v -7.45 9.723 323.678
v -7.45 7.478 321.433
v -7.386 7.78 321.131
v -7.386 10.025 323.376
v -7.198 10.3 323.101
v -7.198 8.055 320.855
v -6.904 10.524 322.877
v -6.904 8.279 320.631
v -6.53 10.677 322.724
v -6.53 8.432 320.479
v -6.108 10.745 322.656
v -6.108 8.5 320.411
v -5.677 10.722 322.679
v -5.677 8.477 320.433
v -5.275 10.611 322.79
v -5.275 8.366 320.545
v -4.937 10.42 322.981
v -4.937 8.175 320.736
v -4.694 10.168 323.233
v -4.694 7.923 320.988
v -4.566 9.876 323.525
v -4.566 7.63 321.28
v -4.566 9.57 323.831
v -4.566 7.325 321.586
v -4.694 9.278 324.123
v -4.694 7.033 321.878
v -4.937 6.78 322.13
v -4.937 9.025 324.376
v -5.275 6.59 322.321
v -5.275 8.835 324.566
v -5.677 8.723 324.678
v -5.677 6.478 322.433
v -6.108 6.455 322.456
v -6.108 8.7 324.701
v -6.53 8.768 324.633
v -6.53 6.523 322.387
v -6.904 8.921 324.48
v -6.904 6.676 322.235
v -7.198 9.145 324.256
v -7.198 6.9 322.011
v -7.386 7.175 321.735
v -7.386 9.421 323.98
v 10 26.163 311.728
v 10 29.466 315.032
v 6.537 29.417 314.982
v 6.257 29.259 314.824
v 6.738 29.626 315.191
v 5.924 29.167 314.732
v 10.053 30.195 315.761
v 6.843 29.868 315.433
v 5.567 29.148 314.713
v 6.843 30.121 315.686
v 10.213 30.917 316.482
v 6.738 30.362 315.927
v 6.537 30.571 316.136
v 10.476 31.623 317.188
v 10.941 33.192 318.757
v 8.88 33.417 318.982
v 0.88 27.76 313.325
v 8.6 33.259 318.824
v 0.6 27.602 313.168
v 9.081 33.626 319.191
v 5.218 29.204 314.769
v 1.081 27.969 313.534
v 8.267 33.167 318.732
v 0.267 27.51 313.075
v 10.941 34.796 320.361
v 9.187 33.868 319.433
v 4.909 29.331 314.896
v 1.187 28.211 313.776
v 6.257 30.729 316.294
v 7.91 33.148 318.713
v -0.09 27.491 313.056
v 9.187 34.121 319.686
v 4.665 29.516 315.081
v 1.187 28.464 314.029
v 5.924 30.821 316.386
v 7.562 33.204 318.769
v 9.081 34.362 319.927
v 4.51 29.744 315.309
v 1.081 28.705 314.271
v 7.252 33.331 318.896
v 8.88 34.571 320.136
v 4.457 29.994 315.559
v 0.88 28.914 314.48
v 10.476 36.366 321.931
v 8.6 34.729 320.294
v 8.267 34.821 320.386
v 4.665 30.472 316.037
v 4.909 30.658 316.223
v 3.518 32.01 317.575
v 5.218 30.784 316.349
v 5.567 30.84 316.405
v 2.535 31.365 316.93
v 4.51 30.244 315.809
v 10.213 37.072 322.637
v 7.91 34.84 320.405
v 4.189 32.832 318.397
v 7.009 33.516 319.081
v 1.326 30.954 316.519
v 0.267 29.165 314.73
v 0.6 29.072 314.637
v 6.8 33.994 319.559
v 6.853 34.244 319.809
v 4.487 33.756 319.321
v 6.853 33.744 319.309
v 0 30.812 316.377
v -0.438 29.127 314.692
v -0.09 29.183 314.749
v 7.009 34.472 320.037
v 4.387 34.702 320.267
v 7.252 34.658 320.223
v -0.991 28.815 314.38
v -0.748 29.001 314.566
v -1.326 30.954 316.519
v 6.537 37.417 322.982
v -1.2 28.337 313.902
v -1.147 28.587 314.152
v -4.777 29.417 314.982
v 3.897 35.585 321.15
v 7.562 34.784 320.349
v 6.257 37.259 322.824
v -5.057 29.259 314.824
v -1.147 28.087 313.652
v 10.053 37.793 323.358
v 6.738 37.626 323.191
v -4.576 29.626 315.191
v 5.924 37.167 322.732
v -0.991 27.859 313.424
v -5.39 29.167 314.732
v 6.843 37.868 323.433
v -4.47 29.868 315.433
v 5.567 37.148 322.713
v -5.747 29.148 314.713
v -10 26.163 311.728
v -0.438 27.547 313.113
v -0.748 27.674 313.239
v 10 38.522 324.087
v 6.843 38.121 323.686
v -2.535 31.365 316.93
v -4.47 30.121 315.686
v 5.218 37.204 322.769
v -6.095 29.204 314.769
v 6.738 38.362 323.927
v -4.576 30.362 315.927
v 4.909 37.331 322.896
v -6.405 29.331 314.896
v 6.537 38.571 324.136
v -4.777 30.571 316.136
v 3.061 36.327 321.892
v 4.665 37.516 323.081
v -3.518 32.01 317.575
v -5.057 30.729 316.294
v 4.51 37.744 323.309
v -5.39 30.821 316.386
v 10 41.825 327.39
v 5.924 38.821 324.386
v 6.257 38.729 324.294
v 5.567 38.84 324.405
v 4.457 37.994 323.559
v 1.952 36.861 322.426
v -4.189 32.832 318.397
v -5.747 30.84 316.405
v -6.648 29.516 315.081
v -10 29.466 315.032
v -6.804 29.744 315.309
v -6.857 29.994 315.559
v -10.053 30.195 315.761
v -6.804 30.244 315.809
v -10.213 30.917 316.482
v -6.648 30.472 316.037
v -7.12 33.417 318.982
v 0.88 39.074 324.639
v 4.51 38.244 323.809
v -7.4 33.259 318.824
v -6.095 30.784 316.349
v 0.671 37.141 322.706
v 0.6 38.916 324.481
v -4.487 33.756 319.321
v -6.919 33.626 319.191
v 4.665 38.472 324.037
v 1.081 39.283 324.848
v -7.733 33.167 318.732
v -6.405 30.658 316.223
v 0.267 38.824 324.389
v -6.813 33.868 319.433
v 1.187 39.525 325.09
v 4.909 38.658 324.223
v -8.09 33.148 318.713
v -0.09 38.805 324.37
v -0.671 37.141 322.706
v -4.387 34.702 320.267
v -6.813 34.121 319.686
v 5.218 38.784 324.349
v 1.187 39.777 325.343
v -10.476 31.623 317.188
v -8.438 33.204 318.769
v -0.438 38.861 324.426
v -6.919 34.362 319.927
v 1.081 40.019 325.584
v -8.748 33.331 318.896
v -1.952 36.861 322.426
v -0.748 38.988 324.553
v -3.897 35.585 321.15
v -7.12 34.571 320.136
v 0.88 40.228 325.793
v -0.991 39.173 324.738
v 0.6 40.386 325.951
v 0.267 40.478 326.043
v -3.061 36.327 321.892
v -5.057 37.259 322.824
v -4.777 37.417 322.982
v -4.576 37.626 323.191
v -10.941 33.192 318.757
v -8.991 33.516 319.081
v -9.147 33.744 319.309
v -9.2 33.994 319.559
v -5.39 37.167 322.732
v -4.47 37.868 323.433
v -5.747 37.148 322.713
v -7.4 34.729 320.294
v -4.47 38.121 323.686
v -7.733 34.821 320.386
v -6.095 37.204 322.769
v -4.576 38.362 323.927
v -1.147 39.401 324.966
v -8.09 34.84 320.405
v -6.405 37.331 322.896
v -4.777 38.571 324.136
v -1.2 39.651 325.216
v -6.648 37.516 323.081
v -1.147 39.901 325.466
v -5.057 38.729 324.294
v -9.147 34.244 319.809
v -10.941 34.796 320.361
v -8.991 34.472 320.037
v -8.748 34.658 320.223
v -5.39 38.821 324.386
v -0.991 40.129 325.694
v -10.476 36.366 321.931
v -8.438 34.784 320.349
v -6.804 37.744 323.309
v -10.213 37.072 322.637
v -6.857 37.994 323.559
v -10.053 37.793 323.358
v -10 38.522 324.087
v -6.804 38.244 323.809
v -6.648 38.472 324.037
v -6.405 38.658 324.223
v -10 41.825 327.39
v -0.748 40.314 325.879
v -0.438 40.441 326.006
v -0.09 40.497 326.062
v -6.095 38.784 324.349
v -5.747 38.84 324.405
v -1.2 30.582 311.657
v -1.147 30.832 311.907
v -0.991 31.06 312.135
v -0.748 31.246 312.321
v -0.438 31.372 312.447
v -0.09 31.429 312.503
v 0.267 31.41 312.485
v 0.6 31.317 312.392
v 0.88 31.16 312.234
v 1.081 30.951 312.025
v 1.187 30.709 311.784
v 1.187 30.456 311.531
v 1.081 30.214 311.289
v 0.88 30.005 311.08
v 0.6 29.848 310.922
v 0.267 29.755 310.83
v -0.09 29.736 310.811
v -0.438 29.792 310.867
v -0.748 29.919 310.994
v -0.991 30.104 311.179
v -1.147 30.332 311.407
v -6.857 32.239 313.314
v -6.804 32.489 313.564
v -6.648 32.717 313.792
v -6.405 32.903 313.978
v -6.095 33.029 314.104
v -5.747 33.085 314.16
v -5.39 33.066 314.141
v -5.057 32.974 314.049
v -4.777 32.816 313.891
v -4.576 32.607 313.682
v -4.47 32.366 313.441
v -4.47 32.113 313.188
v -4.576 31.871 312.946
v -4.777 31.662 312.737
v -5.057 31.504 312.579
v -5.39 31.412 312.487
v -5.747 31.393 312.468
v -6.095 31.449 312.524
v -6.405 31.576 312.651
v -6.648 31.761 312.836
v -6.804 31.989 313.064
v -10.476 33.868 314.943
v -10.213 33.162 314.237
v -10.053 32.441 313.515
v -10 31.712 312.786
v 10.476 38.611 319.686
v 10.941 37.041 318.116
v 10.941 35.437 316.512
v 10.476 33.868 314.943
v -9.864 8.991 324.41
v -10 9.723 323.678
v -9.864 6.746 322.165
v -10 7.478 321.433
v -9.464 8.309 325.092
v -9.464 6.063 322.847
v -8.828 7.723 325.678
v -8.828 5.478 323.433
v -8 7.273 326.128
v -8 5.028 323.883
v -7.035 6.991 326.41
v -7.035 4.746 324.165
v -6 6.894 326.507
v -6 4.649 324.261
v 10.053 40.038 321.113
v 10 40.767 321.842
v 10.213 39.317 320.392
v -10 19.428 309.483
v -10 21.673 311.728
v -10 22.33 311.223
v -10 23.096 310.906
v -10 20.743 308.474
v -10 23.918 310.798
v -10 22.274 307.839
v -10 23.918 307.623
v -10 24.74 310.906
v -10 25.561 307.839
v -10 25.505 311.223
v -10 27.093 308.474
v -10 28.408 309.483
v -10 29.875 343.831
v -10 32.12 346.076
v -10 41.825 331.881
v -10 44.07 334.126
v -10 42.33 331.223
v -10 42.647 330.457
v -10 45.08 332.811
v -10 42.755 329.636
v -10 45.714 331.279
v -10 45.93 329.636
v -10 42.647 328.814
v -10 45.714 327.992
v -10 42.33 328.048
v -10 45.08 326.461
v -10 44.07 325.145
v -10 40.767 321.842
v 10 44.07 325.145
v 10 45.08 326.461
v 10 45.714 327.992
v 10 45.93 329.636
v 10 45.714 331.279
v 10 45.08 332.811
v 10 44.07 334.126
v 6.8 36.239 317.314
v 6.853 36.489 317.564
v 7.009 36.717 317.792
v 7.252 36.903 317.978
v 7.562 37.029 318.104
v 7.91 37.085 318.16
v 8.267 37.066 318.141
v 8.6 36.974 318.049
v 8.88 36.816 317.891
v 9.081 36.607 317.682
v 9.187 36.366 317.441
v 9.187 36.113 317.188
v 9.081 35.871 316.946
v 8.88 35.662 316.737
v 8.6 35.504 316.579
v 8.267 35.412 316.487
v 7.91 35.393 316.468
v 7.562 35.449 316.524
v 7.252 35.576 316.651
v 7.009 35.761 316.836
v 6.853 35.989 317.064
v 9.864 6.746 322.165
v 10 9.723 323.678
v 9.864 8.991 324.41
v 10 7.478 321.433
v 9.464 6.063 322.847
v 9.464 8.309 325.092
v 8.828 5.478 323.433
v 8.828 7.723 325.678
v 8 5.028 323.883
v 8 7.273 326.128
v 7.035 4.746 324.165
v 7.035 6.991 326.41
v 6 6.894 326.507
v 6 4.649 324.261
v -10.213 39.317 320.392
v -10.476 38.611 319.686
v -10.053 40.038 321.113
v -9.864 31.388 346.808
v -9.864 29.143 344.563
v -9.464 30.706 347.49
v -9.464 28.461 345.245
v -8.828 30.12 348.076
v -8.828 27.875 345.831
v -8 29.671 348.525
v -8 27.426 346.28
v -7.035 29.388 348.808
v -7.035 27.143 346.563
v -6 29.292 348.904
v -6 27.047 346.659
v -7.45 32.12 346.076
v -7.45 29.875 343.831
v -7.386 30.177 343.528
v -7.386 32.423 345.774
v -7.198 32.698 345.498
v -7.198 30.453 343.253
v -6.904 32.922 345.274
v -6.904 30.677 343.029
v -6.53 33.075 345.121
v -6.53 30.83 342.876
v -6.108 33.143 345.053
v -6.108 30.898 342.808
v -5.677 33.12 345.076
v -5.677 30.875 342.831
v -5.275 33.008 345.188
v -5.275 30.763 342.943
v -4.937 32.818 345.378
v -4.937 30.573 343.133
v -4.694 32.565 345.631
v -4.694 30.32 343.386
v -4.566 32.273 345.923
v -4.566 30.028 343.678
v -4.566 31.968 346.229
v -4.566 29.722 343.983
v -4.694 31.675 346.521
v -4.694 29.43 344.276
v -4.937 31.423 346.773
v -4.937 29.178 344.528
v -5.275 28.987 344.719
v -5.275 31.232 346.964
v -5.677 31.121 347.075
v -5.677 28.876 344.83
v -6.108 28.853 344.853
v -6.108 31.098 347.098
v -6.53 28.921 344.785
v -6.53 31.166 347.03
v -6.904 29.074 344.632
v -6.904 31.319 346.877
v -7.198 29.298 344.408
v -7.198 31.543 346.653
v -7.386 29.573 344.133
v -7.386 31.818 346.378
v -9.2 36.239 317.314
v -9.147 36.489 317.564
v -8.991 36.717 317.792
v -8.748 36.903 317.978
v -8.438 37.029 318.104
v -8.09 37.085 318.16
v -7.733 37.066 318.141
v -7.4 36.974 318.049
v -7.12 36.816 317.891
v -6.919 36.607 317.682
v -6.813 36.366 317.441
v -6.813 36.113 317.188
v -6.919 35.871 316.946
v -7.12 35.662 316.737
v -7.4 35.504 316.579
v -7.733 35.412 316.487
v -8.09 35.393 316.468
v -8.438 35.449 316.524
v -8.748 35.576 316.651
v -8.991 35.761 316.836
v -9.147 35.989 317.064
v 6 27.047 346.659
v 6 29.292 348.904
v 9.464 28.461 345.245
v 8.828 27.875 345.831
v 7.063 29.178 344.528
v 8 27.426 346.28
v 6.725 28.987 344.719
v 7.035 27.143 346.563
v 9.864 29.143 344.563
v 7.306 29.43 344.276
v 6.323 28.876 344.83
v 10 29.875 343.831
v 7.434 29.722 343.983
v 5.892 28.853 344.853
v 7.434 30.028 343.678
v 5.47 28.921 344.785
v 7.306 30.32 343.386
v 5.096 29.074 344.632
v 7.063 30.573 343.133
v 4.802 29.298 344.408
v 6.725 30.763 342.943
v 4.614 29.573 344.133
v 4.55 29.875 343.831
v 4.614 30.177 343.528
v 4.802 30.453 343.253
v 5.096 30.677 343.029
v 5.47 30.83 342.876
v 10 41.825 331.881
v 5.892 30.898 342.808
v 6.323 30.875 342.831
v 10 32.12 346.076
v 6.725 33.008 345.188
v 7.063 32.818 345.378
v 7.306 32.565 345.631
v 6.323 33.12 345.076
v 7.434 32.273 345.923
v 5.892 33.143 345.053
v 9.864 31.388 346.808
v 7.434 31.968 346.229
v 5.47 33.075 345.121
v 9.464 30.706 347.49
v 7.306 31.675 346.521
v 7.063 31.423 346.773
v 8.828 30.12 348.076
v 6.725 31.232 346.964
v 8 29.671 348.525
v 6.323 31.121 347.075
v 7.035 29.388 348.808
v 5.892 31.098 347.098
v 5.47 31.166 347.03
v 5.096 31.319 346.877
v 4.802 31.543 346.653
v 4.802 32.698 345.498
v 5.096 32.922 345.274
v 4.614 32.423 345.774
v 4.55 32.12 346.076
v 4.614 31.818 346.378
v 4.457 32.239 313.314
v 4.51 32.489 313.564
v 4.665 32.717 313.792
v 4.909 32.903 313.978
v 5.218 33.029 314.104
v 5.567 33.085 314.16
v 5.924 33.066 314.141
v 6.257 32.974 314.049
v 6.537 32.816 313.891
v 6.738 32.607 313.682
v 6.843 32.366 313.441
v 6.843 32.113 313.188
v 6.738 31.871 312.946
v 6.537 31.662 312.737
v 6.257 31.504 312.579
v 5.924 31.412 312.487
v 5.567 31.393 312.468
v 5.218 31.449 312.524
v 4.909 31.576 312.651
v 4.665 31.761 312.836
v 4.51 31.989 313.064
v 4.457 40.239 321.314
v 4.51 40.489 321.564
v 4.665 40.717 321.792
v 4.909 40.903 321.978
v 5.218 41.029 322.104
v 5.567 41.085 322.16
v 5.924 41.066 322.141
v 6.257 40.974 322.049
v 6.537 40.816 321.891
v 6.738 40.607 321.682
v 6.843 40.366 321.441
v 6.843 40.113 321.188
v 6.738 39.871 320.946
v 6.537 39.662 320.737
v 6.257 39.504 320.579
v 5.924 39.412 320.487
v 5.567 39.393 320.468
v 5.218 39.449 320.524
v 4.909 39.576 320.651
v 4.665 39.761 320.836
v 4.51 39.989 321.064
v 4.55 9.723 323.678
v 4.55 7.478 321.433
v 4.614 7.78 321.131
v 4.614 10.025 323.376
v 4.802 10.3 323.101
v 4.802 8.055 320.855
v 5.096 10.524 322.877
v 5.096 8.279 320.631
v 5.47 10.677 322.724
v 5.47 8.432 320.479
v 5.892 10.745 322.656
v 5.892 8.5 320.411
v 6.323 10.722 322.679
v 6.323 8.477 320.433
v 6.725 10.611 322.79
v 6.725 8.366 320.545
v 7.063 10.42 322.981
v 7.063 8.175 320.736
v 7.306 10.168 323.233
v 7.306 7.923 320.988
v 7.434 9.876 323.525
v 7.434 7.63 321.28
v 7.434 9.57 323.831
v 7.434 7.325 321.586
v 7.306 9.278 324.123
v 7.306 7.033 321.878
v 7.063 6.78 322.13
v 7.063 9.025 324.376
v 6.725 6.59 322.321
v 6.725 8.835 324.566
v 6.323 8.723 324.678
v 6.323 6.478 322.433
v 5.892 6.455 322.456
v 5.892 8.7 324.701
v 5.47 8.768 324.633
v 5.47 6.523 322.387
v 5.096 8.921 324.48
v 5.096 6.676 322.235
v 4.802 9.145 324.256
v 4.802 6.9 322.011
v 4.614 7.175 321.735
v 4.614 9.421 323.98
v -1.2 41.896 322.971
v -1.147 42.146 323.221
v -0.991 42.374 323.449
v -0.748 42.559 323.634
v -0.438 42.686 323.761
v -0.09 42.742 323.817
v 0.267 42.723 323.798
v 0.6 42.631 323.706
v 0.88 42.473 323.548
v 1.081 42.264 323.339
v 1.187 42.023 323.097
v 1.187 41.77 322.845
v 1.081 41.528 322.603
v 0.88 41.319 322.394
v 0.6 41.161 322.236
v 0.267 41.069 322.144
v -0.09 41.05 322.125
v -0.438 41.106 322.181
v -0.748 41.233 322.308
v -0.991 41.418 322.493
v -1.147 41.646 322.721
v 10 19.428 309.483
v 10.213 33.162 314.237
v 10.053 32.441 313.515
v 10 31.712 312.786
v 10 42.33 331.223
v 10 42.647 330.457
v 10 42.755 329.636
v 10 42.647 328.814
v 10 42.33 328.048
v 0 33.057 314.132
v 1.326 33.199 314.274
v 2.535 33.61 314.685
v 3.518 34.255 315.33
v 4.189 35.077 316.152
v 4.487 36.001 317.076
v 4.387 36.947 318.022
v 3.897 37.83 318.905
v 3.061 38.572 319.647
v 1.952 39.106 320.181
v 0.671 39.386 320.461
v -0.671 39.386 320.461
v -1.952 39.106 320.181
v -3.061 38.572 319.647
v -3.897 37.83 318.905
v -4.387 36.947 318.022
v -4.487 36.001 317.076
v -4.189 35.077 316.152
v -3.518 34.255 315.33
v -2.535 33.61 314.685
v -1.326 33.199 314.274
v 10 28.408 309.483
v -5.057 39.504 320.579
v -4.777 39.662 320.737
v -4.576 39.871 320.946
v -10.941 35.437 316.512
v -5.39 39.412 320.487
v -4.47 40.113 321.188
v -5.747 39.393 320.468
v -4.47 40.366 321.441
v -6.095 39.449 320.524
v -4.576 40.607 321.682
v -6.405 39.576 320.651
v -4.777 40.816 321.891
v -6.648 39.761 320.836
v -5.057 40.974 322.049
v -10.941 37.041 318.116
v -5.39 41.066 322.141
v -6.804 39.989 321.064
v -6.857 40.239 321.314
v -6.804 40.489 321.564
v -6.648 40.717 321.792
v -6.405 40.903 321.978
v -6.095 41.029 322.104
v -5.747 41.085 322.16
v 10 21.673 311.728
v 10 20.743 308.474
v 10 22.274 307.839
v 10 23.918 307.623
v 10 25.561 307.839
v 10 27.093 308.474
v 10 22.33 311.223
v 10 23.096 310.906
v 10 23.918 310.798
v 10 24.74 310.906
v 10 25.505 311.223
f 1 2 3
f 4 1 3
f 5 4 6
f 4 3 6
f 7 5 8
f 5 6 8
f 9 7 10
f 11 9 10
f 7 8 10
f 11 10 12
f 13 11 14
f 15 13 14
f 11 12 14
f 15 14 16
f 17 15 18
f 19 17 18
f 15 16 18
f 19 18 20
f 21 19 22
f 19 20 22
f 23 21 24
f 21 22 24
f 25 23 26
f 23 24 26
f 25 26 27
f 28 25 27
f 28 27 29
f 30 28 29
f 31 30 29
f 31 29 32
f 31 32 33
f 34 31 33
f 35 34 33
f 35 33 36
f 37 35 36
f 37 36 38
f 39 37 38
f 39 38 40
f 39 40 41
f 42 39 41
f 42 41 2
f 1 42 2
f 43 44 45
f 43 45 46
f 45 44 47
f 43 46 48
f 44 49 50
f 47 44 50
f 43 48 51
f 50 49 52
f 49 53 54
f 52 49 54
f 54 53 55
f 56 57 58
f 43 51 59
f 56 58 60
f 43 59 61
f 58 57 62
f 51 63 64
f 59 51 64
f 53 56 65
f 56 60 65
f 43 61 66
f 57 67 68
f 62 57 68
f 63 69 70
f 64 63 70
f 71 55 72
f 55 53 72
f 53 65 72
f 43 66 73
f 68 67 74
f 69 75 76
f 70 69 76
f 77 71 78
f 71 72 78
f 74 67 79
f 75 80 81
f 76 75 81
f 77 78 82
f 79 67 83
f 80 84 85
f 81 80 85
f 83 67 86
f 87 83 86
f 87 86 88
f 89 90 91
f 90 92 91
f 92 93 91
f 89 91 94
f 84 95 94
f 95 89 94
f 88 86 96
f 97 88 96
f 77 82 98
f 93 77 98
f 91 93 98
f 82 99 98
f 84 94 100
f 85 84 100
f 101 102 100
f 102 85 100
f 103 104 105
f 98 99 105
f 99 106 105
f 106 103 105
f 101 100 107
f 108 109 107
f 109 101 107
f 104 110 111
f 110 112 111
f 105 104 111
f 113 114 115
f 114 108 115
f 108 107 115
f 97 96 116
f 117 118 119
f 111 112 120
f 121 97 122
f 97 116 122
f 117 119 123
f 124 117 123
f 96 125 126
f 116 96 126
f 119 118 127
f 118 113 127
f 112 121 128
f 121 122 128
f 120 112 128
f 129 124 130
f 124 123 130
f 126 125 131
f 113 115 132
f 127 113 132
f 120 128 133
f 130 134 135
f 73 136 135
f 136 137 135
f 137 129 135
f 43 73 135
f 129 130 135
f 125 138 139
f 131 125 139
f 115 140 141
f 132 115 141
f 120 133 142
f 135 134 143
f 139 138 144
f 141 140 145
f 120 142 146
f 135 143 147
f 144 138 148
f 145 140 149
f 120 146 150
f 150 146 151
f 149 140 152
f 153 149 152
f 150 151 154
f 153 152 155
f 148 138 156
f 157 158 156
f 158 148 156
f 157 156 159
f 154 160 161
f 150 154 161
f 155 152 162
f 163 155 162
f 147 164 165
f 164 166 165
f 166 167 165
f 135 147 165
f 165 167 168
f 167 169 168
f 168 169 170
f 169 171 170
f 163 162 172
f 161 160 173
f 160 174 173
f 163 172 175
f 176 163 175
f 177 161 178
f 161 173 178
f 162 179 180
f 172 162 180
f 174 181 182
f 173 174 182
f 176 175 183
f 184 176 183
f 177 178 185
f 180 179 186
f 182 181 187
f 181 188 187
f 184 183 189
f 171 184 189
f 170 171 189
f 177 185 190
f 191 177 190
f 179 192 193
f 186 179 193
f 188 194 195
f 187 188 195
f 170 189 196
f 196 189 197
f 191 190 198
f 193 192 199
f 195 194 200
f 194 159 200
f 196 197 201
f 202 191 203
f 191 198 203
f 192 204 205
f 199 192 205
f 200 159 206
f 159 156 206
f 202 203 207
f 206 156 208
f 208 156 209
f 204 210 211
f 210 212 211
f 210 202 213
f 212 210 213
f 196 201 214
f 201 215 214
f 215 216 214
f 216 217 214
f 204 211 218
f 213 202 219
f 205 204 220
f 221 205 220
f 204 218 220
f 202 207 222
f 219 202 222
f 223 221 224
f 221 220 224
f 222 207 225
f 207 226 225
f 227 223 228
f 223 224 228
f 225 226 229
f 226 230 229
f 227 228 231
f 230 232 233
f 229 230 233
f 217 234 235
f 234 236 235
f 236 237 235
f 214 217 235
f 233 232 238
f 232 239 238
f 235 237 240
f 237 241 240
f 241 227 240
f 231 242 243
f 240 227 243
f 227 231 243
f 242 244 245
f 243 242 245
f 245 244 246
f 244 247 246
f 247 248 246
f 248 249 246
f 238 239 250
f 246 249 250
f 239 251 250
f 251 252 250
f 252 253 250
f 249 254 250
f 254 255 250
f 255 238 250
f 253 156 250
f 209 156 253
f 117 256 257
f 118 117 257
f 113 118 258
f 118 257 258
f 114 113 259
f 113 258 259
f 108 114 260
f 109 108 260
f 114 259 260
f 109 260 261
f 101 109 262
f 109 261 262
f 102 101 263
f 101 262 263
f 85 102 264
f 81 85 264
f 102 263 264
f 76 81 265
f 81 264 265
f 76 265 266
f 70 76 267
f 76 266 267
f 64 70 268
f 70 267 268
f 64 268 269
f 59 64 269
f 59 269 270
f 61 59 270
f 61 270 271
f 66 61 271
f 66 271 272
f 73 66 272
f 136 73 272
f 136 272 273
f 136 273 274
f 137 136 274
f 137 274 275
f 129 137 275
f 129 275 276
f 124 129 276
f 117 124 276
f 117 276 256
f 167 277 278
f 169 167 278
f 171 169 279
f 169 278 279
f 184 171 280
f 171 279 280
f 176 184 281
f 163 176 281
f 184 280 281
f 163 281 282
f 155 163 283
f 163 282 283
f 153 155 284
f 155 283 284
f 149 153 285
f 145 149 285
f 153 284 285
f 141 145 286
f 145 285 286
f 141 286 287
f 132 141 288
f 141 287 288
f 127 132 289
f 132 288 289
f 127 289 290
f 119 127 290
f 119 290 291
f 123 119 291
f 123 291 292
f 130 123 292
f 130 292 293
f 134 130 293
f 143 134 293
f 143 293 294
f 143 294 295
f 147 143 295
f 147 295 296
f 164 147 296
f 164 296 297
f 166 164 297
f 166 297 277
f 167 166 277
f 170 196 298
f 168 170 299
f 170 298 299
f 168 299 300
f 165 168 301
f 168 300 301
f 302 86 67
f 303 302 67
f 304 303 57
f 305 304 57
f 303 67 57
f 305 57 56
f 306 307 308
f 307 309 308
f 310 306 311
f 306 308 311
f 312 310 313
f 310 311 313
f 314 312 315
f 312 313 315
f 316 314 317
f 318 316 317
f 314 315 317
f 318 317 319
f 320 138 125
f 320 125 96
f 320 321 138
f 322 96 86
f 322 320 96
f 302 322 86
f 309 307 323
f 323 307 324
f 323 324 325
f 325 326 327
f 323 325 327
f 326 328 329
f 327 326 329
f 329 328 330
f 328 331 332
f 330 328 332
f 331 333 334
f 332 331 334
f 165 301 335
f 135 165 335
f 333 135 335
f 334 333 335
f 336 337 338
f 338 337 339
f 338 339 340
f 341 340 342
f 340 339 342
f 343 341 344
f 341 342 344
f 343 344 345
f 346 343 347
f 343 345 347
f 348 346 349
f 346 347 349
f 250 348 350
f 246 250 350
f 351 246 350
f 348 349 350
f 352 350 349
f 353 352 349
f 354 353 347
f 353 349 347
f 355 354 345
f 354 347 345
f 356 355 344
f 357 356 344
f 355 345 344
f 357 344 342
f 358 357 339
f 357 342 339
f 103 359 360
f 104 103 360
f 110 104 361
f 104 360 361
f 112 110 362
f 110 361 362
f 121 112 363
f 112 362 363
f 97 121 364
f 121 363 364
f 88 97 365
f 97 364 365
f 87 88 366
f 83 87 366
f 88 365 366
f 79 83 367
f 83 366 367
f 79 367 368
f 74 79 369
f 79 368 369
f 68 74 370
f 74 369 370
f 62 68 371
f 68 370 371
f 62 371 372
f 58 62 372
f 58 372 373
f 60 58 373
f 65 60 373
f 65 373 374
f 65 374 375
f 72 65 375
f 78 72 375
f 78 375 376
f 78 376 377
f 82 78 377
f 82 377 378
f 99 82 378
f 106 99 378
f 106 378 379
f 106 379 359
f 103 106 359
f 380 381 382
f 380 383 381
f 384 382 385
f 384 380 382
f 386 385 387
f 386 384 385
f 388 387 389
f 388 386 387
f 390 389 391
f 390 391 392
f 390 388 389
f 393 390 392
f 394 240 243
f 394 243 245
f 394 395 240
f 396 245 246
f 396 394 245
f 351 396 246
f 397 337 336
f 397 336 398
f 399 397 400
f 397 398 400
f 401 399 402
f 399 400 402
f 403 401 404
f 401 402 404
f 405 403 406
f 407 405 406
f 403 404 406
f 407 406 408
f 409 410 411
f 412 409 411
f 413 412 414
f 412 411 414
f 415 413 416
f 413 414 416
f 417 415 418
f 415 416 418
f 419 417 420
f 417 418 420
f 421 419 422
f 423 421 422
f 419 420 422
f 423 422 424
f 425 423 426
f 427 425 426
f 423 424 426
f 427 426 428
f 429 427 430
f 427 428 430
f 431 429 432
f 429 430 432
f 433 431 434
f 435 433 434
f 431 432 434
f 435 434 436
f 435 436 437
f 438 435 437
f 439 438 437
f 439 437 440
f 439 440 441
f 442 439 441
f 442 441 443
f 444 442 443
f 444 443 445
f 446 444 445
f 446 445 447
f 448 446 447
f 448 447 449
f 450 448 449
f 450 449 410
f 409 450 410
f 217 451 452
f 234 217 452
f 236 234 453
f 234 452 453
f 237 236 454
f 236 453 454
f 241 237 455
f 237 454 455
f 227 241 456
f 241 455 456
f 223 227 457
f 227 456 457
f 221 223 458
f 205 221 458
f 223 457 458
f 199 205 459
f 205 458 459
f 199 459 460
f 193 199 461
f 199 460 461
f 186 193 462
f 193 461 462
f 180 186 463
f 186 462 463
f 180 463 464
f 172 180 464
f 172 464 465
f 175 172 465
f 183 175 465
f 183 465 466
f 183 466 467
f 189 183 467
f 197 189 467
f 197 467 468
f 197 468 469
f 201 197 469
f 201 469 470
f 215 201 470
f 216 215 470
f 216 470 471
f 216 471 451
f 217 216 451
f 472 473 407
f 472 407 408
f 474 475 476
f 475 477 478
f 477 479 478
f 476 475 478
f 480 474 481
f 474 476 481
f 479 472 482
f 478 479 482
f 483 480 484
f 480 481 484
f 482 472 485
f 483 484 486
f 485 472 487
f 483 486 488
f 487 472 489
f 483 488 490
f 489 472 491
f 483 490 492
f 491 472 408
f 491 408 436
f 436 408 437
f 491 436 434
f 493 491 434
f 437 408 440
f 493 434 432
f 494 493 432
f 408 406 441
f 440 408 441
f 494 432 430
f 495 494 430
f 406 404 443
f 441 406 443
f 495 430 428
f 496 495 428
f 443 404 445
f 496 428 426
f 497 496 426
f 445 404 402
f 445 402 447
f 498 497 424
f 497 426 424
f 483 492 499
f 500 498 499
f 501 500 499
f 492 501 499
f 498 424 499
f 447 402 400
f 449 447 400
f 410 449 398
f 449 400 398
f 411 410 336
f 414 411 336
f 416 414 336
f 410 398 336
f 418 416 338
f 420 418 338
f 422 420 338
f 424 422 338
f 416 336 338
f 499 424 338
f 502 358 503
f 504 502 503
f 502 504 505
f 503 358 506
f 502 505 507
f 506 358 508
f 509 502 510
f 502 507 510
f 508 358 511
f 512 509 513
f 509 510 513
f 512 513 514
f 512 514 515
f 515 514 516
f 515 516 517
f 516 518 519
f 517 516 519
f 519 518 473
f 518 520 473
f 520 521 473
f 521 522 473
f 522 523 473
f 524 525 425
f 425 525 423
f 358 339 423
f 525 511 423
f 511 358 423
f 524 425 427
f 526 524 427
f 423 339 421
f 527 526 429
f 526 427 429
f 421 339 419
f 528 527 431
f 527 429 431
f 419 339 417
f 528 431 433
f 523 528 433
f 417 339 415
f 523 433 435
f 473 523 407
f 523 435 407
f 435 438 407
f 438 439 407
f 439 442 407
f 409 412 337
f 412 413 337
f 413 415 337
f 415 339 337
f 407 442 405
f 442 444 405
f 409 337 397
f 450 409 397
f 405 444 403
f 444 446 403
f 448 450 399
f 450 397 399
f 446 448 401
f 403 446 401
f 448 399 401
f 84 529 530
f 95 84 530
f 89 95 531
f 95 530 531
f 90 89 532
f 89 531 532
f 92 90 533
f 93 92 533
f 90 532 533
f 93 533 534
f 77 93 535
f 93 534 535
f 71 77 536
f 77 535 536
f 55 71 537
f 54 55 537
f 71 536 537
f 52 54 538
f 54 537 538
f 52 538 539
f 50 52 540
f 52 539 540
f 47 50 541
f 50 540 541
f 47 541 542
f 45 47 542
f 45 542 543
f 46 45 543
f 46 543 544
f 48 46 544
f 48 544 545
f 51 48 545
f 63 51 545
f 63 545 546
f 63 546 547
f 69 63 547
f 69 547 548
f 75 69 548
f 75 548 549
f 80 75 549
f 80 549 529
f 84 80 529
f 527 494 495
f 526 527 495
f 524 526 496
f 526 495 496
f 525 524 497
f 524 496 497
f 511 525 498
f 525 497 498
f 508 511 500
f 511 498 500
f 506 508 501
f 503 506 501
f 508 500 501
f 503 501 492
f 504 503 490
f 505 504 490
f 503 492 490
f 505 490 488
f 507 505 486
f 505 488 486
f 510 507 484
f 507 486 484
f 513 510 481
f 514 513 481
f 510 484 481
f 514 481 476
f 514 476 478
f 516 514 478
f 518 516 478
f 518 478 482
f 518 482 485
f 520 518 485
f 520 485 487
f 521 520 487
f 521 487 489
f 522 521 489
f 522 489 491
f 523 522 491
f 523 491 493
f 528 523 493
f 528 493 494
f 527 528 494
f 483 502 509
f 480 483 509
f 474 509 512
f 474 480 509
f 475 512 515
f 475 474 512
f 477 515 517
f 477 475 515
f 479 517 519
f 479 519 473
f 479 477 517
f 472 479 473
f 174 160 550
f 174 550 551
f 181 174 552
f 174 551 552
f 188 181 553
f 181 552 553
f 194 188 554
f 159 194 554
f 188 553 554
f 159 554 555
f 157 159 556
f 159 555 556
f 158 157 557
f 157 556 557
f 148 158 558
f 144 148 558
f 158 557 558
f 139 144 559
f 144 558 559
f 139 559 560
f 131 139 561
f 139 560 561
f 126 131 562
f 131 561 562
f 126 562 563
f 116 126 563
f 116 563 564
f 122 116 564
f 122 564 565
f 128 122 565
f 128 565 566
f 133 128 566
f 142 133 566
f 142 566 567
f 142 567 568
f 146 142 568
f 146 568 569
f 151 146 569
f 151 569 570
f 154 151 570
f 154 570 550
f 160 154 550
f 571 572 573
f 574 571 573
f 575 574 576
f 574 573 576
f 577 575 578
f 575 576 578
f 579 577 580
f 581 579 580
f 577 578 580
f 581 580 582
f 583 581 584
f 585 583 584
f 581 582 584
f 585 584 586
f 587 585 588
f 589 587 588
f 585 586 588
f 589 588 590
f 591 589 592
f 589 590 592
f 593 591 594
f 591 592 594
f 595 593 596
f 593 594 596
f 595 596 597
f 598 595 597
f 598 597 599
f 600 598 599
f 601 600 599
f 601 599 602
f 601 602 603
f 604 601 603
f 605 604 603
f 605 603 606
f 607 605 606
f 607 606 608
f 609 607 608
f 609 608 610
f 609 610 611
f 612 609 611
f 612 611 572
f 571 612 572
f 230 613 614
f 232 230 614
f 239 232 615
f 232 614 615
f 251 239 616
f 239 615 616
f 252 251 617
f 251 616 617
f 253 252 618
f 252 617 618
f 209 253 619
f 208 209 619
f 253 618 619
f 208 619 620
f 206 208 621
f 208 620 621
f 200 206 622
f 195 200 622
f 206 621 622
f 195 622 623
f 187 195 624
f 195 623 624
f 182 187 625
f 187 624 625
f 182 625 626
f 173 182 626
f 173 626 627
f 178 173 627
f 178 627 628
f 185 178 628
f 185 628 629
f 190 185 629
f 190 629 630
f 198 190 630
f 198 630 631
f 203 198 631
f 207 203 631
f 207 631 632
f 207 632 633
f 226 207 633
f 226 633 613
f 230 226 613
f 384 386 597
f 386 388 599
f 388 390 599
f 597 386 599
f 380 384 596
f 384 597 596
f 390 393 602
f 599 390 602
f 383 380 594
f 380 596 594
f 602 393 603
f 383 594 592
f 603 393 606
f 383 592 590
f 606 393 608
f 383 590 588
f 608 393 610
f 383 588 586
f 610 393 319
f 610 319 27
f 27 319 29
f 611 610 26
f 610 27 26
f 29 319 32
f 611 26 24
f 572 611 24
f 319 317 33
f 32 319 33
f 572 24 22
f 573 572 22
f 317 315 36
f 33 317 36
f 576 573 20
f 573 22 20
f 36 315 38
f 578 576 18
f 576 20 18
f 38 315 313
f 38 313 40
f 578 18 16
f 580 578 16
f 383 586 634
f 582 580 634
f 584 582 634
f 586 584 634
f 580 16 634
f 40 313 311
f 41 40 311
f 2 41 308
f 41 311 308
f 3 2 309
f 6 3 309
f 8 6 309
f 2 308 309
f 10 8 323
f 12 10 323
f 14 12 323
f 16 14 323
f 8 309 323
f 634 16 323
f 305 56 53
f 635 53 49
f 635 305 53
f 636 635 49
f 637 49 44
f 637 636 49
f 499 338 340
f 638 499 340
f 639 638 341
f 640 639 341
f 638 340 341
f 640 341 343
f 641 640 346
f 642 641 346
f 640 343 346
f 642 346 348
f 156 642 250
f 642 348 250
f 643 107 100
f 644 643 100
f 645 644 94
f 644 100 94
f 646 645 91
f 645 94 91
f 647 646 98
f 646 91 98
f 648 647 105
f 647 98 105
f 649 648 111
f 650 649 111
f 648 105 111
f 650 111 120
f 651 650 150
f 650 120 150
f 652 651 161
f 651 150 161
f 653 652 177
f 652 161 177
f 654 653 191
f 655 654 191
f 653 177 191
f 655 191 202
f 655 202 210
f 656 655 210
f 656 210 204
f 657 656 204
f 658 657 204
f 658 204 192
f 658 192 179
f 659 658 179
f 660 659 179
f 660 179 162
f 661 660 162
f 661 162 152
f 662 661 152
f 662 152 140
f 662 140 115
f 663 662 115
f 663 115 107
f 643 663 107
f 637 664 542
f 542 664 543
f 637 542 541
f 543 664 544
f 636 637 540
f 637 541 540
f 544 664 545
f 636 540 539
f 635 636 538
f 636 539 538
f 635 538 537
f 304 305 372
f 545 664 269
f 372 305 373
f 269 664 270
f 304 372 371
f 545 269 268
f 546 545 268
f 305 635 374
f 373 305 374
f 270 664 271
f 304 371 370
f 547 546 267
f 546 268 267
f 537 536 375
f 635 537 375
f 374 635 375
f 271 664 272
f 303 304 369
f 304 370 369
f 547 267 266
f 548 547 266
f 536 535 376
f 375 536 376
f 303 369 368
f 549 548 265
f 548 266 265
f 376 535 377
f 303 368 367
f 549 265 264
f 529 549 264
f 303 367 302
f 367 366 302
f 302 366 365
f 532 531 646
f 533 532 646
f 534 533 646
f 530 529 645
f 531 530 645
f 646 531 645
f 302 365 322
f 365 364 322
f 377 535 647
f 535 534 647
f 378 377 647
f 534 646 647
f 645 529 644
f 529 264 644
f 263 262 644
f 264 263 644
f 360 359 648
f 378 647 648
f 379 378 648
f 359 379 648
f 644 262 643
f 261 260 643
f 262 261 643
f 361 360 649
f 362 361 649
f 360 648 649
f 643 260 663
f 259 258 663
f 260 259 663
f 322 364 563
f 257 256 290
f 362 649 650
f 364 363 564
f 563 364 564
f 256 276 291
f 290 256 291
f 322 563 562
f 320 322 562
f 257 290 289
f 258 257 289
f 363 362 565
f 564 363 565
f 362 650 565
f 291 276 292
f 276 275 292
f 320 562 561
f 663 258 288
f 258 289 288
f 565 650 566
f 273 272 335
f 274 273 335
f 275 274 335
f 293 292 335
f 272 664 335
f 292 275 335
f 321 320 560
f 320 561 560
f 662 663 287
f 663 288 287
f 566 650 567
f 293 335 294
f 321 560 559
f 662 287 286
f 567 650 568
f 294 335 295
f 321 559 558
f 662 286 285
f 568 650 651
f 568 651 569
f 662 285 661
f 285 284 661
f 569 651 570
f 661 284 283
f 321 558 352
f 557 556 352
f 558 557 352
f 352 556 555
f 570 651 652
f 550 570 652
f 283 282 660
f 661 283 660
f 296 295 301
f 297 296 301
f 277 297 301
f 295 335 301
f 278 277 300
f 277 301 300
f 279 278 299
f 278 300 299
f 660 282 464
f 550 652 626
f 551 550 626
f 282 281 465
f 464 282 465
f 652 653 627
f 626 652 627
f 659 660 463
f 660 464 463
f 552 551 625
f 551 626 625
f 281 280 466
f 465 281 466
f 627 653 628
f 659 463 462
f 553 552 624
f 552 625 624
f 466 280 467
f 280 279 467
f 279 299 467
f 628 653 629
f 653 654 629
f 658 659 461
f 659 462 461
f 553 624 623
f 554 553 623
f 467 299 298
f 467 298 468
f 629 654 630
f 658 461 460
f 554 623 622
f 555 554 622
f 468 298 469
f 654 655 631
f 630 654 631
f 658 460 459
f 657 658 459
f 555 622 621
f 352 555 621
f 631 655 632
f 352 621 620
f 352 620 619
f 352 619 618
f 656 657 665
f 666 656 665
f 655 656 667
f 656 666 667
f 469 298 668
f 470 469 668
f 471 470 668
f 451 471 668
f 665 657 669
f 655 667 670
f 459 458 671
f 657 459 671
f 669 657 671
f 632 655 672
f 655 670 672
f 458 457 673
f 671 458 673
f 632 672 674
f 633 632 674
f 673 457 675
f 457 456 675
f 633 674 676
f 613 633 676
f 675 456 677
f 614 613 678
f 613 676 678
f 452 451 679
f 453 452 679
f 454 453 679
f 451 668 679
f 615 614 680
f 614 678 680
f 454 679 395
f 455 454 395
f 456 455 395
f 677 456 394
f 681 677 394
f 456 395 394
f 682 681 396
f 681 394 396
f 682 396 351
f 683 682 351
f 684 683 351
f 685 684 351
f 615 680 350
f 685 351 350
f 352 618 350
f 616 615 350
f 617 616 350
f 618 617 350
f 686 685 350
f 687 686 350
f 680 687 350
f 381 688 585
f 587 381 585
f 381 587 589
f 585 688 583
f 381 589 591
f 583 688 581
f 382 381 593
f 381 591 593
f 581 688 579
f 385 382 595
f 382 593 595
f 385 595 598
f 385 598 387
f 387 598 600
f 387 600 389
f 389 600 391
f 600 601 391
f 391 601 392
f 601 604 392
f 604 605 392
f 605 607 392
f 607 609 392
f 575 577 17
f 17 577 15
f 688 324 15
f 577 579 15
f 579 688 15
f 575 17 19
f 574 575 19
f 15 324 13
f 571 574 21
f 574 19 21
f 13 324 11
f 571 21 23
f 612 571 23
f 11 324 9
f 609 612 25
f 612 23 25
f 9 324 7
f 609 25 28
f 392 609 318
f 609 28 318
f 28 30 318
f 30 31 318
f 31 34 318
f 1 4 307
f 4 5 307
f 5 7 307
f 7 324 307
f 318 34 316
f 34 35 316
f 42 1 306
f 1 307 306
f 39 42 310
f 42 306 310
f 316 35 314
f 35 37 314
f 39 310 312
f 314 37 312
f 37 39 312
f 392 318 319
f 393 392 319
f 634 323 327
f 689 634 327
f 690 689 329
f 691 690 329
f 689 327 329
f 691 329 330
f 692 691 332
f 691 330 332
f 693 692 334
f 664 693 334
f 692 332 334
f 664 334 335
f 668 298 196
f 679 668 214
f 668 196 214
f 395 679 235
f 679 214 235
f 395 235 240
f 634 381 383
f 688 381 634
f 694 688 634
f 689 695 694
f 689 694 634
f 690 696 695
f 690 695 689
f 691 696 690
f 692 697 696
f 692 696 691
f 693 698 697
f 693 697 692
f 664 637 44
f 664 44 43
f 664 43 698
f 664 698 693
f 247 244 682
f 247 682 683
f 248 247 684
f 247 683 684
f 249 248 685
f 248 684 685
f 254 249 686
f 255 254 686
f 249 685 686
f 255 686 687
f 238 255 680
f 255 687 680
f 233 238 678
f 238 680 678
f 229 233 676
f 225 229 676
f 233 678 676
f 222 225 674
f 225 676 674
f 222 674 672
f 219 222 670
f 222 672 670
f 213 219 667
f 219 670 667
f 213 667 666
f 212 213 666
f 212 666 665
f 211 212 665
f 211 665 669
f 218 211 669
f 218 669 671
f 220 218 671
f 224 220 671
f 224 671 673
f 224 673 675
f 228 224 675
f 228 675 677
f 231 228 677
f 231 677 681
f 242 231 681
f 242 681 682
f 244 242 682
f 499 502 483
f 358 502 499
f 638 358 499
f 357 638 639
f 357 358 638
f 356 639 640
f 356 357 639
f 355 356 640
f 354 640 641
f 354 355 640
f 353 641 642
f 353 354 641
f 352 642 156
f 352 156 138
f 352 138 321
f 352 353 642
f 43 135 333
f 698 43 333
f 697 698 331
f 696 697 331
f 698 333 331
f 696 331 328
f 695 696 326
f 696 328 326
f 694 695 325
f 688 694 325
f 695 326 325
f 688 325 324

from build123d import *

# Parameters (mm, degrees)
BASE_FLANGE2_DEPTH      = 10
BASE_FLANGE2_DEPTH_BACK = 10
TAB1_DEPTH              = 3.175
FILLET2_R               = 10
M2_5_CLEARANCE_HOLE1_D  = 2.9
FILLET1_R               = 4
M2_CLEARANCE_HOLE2_D    = 2.4
SKETCH24_R              = 4.5
CUT_EXTRUDE1_DEPTH      = 10


# Sheet-metal steps are written as plain solids
with BuildPart() as part:
    # Sketch9 → Base-Flange2 (new, two sides: drawn at the far end of the back side and taken through both)
    with BuildSketch(Plane(origin=(0, 0, 0), x_dir=(0, 0, -1), z_dir=(1, 0, 0)).offset(-BASE_FLANGE2_DEPTH_BACK)):
        with BuildLine():
            Line((-346.659099477, 27.04683438), (-331.88056775, 41.825366107))
            ThreePointArc((-331.88056775, 41.825366107), (-329.63550372, 42.755302077), (-327.390439689, 41.825366107))
            Line((-327.390439689, 41.825366107), (-311.728024486, 26.162950904))
            ThreePointArc((-311.728024486, 26.162950904), (-310.798088516, 23.917886874), (-311.728024486, 21.672822843))
            Line((-311.728024486, 21.672822843), (-326.506556213, 6.894291117))
            Line((-326.506556213, 6.894291117), (-324.261492183, 4.649227086))
            Line((-324.261492183, 4.649227086), (-309.482960456, 19.427758813))
            ThreePointArc((-309.482960456, 19.427758813), (-307.623088516, 23.917886874), (-309.482960456, 28.408014934))
            Line((-309.482960456, 28.408014934), (-325.145375659, 44.070430137))
            ThreePointArc((-325.145375659, 44.070430137), (-329.63550372, 45.930302077), (-334.12563178, 44.070430137))
            Line((-334.12563178, 44.070430137), (-348.904163507, 29.291898411))
            Line((-348.904163507, 29.291898411), (-346.659099477, 27.04683438))
        make_face()
    extrude(amount=BASE_FLANGE2_DEPTH + BASE_FLANGE2_DEPTH_BACK)

    # Sketch25 → Tab1 (add)
    with BuildSketch(Plane(origin=(0, -142.782536791, 142.782536791), x_dir=(1, 0, 0), z_dir=(0, -0.7071067811865472, 0.7071067811865479))):
        with BuildLine():
            Line((-10, 254.582575695), (10, 254.582575695))
            ThreePointArc((10, 254.582575695), (11, 250), (10, 245.417424305))
            Line((10, 245.417424305), (-10, 245.417424305))
            ThreePointArc((-10, 245.417424305), (-11, 250), (-10, 254.582575695))
        make_face()
    extrude(amount=-TAB1_DEPTH)

    # Fillet2
    fillet2_edges = [part.edges().sort_by_distance(p)[0] for p in [
        (-10, 31.876320171, 315.196329723),
        (-10, 38.35706087, 321.677070422),
        (10, 38.35706087, 321.677070422),
        (10, 31.876320171, 315.196329723),
    ]]
    fillet(fillet2_edges, radius=FILLET2_R)

    # M2.5 Clearance Hole1 (through all)
    with Locations(Plane(origin=(0, 189.098030959, 189.098030959), x_dir=(1, 0, 0), z_dir=(0, 0.7071067811865477, 0.7071067811865475))):
        with Locations((-6, -222), (6, -222)):
            Hole(M2_5_CLEARANCE_HOLE1_D / 2)

    # Fillet1
    fillet1_edges = [part.edges().sort_by_distance(p)[0] for p in [
        (-10, 28.169366396, 347.781631492),
        (10, 28.169366396, 347.781631492),
        (-10, 5.771759101, 325.384024198),
        (10, 5.771759101, 325.384024198),
    ]]
    fillet(fillet1_edges, radius=FILLET1_R)

    # M2 Clearance Hole2 (through all)
    with Locations(Plane(origin=(0, -142.782536791, 142.782536791), x_dir=(1, 0, 0), z_dir=(0, -0.7071067811865472, 0.7071067811865479))):
        with Locations((0, 258), (5.656854249, 255.656854249), (8, 250), (5.656854249, 244.343145751), (0, 242), (-5.656854249, 244.343145751), (-8, 250), (-5.656854249, 255.656854249)):
            Hole(M2_CLEARANCE_HOLE2_D / 2)

    # Sketch24 → Cut-Extrude1 (cut)
    with BuildSketch(Plane(origin=(0, -142.782536791, 142.782536791), x_dir=(1, 0, 0), z_dir=(0, -0.7071067811865472, 0.7071067811865479))):
        with Locations(Location((0, 250, 0), (0, 0, 270))):
            Circle(SKETCH24_R)
    extrude(amount=-CUT_EXTRUDE1_DEPTH, mode=Mode.SUBTRACT)


solid = part.part
